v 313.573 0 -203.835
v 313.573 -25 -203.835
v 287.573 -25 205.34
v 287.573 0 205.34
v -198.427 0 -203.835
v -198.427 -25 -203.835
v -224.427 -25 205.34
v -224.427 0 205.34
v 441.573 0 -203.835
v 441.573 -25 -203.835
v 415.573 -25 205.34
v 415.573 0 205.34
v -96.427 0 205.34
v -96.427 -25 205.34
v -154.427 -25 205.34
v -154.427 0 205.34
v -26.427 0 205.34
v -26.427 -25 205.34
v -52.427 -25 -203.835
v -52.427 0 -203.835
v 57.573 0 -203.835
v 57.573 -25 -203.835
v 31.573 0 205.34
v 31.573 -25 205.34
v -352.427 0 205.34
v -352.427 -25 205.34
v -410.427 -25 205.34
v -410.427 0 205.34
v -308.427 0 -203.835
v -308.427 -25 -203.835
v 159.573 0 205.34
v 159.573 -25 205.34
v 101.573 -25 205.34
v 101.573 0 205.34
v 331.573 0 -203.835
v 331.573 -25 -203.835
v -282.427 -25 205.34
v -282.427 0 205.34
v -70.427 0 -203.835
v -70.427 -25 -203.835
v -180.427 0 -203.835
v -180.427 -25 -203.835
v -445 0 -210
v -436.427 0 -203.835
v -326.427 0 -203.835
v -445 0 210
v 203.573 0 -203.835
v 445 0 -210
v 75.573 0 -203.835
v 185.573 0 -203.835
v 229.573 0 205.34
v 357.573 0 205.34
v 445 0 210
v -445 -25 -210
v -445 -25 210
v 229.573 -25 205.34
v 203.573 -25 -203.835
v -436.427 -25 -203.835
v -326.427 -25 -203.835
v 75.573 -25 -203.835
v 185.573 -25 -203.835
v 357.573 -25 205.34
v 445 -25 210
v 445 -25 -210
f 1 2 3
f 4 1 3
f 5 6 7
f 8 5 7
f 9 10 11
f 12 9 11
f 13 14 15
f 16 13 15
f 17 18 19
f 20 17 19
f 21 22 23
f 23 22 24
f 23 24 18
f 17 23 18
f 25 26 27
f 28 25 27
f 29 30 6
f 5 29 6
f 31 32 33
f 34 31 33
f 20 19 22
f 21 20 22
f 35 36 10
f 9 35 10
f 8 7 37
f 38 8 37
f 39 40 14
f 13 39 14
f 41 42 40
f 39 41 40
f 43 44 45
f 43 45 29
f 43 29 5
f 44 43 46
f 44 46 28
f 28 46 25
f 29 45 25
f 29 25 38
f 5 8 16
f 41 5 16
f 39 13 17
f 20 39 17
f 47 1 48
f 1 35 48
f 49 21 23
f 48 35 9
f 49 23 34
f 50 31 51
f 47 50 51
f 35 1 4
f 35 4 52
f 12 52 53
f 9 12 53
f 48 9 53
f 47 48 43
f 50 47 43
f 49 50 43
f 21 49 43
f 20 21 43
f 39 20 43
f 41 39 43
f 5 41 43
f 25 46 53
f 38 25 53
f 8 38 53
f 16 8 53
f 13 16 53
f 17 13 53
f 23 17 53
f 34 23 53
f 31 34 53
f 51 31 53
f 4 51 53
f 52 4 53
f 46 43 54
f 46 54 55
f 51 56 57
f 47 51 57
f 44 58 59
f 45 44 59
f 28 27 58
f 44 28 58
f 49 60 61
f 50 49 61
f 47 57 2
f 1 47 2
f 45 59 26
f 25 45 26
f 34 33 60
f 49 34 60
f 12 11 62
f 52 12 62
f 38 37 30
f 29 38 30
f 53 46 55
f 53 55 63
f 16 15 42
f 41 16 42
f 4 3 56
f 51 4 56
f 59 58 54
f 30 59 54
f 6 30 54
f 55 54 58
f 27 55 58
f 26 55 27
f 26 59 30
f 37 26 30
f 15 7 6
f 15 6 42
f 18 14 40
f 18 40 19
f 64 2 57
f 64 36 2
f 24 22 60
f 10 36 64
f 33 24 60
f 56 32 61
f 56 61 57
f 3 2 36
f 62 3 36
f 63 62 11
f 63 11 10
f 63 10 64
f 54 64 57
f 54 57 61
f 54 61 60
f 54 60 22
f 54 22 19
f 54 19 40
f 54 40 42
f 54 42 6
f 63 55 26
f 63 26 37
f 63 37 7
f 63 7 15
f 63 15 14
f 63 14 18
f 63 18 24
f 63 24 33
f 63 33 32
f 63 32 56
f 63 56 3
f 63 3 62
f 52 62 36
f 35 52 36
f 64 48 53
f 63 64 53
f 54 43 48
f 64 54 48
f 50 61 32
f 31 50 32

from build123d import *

# Parameters (mm, degrees)
F0_W     = 890
F0_H     = 420
F1_DEPTH = 25
F3_DEPTH = 25


with BuildPart() as f1:
    # F0 (on Front) → F1 (new body)
    with BuildSketch(Plane.XZ):
        Rectangle(F0_W, F0_H)
    extrude(amount=F1_DEPTH)

    # F2 (on face) → F3 (cut)
    with BuildSketch(Plane.XZ.offset(25)):
        Polygon((-436.426692, -203.834898), (-381.426692, -203.834898), (-326.426692, -203.834898), (-352.426692, 205.339882), (-381.426692, 205.339882), (-410.426692, 205.339882), align=None)
        Polygon((-308.426692, -203.834898), (-253.426692, -203.834898), (-198.426692, -203.834898), (-224.426692, 205.339882), (-253.426692, 205.339882), (-282.426692, 205.339882), align=None)
        Polygon((-180.426692, -203.834898), (-125.426692, -203.834898), (-70.426692, -203.834898), (-96.426692, 205.339882), (-125.426692, 205.339882), (-154.426692, 205.339882), align=None)
        Polygon((-52.426692, -203.834898), (2.573308, -203.834898), (57.573308, -203.834898), (31.573308, 205.339882), (2.573308, 205.339882), (-26.426692, 205.339882), align=None)
        Polygon((75.573308, -203.834898), (130.573308, -203.834898), (185.573308, -203.834898), (159.573308, 205.339882), (130.573308, 205.339882), (101.573308, 205.339882), align=None)
        Polygon((203.573308, -203.834898), (258.573308, -203.834898), (313.573308, -203.834898), (287.573308, 205.339882), (258.573308, 205.339882), (229.573308, 205.339882), align=None)
        Polygon((331.573308, -203.834898), (386.573308, -203.834898), (441.573308, -203.834898), (415.573308, 205.339882), (386.573308, 205.339882), (357.573308, 205.339882), align=None)
    extrude(amount=-F3_DEPTH, mode=Mode.SUBTRACT)


solid = f1.part
